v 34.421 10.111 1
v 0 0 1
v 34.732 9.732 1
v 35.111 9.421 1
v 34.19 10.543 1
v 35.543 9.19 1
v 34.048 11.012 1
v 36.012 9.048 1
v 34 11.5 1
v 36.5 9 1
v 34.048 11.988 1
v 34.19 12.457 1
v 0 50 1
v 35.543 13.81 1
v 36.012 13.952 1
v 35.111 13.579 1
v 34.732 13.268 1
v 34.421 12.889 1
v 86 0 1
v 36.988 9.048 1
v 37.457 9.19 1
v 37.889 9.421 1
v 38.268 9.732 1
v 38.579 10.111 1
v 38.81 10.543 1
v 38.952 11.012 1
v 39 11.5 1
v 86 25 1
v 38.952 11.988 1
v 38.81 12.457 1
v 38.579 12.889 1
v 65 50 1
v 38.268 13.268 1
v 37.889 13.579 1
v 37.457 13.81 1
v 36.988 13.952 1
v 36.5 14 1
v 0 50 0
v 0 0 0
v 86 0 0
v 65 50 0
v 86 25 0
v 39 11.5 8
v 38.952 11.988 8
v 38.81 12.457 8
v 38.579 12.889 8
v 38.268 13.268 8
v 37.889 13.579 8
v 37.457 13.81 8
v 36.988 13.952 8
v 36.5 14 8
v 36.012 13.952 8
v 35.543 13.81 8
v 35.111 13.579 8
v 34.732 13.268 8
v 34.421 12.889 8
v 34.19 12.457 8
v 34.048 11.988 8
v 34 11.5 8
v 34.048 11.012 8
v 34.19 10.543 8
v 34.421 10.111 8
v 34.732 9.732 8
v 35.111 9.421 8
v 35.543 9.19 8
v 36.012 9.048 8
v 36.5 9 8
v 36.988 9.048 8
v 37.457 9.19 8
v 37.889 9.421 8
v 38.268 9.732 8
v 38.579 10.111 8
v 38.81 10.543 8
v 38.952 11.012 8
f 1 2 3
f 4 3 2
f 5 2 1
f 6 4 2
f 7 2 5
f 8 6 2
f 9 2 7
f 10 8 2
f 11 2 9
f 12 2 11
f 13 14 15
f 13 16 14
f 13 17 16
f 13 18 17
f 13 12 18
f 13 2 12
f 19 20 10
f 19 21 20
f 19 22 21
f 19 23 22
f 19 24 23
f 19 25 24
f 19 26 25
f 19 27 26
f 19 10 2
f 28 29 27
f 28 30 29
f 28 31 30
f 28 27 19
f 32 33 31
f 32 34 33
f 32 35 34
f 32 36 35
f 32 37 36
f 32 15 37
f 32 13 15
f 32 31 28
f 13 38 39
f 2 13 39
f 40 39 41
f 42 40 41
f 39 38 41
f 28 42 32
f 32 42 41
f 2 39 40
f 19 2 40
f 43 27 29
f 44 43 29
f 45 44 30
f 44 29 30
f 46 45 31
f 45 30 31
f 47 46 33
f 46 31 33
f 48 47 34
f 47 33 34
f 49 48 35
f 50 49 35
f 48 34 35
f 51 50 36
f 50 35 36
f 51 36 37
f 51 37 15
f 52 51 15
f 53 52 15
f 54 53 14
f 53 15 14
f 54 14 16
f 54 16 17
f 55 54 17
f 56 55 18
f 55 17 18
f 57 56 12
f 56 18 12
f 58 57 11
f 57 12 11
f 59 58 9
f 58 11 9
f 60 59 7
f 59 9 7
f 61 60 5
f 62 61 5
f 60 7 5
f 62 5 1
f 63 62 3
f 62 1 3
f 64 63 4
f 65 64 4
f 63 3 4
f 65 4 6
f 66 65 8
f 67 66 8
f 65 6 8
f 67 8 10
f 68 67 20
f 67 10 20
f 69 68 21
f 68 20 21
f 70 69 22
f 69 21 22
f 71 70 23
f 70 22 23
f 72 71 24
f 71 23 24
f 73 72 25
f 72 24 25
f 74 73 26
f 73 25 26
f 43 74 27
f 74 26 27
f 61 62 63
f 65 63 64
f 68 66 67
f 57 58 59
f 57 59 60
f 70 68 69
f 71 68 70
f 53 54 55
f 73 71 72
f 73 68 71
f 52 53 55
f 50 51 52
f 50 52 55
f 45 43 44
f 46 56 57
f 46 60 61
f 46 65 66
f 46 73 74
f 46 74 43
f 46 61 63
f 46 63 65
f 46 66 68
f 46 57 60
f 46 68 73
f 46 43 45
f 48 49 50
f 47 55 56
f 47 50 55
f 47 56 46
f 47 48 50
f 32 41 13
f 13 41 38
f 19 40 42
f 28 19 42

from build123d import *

# Parameters (mm, degrees)
BOSS_EXTRUDE1_DEPTH = 1
SKETCH3_R           = 2.5
BOSS_EXTRUDE3_DEPTH = 7


with BuildPart() as part:
    # Sketch1 → Boss-Extrude1 (new body)
    with BuildSketch(Plane.XY):
        Polygon((0, 0), (86, 0), (86, 25), (65, 50), (0, 50), align=None)
    extrude(amount=BOSS_EXTRUDE1_DEPTH)

    # Sketch3 → Boss-Extrude3 (add)
    with BuildSketch(Plane.XY.offset(1)):
        with Locations((36.5, 11.5)):
            Circle(SKETCH3_R)
    extrude(amount=BOSS_EXTRUDE3_DEPTH)


solid = part.part
